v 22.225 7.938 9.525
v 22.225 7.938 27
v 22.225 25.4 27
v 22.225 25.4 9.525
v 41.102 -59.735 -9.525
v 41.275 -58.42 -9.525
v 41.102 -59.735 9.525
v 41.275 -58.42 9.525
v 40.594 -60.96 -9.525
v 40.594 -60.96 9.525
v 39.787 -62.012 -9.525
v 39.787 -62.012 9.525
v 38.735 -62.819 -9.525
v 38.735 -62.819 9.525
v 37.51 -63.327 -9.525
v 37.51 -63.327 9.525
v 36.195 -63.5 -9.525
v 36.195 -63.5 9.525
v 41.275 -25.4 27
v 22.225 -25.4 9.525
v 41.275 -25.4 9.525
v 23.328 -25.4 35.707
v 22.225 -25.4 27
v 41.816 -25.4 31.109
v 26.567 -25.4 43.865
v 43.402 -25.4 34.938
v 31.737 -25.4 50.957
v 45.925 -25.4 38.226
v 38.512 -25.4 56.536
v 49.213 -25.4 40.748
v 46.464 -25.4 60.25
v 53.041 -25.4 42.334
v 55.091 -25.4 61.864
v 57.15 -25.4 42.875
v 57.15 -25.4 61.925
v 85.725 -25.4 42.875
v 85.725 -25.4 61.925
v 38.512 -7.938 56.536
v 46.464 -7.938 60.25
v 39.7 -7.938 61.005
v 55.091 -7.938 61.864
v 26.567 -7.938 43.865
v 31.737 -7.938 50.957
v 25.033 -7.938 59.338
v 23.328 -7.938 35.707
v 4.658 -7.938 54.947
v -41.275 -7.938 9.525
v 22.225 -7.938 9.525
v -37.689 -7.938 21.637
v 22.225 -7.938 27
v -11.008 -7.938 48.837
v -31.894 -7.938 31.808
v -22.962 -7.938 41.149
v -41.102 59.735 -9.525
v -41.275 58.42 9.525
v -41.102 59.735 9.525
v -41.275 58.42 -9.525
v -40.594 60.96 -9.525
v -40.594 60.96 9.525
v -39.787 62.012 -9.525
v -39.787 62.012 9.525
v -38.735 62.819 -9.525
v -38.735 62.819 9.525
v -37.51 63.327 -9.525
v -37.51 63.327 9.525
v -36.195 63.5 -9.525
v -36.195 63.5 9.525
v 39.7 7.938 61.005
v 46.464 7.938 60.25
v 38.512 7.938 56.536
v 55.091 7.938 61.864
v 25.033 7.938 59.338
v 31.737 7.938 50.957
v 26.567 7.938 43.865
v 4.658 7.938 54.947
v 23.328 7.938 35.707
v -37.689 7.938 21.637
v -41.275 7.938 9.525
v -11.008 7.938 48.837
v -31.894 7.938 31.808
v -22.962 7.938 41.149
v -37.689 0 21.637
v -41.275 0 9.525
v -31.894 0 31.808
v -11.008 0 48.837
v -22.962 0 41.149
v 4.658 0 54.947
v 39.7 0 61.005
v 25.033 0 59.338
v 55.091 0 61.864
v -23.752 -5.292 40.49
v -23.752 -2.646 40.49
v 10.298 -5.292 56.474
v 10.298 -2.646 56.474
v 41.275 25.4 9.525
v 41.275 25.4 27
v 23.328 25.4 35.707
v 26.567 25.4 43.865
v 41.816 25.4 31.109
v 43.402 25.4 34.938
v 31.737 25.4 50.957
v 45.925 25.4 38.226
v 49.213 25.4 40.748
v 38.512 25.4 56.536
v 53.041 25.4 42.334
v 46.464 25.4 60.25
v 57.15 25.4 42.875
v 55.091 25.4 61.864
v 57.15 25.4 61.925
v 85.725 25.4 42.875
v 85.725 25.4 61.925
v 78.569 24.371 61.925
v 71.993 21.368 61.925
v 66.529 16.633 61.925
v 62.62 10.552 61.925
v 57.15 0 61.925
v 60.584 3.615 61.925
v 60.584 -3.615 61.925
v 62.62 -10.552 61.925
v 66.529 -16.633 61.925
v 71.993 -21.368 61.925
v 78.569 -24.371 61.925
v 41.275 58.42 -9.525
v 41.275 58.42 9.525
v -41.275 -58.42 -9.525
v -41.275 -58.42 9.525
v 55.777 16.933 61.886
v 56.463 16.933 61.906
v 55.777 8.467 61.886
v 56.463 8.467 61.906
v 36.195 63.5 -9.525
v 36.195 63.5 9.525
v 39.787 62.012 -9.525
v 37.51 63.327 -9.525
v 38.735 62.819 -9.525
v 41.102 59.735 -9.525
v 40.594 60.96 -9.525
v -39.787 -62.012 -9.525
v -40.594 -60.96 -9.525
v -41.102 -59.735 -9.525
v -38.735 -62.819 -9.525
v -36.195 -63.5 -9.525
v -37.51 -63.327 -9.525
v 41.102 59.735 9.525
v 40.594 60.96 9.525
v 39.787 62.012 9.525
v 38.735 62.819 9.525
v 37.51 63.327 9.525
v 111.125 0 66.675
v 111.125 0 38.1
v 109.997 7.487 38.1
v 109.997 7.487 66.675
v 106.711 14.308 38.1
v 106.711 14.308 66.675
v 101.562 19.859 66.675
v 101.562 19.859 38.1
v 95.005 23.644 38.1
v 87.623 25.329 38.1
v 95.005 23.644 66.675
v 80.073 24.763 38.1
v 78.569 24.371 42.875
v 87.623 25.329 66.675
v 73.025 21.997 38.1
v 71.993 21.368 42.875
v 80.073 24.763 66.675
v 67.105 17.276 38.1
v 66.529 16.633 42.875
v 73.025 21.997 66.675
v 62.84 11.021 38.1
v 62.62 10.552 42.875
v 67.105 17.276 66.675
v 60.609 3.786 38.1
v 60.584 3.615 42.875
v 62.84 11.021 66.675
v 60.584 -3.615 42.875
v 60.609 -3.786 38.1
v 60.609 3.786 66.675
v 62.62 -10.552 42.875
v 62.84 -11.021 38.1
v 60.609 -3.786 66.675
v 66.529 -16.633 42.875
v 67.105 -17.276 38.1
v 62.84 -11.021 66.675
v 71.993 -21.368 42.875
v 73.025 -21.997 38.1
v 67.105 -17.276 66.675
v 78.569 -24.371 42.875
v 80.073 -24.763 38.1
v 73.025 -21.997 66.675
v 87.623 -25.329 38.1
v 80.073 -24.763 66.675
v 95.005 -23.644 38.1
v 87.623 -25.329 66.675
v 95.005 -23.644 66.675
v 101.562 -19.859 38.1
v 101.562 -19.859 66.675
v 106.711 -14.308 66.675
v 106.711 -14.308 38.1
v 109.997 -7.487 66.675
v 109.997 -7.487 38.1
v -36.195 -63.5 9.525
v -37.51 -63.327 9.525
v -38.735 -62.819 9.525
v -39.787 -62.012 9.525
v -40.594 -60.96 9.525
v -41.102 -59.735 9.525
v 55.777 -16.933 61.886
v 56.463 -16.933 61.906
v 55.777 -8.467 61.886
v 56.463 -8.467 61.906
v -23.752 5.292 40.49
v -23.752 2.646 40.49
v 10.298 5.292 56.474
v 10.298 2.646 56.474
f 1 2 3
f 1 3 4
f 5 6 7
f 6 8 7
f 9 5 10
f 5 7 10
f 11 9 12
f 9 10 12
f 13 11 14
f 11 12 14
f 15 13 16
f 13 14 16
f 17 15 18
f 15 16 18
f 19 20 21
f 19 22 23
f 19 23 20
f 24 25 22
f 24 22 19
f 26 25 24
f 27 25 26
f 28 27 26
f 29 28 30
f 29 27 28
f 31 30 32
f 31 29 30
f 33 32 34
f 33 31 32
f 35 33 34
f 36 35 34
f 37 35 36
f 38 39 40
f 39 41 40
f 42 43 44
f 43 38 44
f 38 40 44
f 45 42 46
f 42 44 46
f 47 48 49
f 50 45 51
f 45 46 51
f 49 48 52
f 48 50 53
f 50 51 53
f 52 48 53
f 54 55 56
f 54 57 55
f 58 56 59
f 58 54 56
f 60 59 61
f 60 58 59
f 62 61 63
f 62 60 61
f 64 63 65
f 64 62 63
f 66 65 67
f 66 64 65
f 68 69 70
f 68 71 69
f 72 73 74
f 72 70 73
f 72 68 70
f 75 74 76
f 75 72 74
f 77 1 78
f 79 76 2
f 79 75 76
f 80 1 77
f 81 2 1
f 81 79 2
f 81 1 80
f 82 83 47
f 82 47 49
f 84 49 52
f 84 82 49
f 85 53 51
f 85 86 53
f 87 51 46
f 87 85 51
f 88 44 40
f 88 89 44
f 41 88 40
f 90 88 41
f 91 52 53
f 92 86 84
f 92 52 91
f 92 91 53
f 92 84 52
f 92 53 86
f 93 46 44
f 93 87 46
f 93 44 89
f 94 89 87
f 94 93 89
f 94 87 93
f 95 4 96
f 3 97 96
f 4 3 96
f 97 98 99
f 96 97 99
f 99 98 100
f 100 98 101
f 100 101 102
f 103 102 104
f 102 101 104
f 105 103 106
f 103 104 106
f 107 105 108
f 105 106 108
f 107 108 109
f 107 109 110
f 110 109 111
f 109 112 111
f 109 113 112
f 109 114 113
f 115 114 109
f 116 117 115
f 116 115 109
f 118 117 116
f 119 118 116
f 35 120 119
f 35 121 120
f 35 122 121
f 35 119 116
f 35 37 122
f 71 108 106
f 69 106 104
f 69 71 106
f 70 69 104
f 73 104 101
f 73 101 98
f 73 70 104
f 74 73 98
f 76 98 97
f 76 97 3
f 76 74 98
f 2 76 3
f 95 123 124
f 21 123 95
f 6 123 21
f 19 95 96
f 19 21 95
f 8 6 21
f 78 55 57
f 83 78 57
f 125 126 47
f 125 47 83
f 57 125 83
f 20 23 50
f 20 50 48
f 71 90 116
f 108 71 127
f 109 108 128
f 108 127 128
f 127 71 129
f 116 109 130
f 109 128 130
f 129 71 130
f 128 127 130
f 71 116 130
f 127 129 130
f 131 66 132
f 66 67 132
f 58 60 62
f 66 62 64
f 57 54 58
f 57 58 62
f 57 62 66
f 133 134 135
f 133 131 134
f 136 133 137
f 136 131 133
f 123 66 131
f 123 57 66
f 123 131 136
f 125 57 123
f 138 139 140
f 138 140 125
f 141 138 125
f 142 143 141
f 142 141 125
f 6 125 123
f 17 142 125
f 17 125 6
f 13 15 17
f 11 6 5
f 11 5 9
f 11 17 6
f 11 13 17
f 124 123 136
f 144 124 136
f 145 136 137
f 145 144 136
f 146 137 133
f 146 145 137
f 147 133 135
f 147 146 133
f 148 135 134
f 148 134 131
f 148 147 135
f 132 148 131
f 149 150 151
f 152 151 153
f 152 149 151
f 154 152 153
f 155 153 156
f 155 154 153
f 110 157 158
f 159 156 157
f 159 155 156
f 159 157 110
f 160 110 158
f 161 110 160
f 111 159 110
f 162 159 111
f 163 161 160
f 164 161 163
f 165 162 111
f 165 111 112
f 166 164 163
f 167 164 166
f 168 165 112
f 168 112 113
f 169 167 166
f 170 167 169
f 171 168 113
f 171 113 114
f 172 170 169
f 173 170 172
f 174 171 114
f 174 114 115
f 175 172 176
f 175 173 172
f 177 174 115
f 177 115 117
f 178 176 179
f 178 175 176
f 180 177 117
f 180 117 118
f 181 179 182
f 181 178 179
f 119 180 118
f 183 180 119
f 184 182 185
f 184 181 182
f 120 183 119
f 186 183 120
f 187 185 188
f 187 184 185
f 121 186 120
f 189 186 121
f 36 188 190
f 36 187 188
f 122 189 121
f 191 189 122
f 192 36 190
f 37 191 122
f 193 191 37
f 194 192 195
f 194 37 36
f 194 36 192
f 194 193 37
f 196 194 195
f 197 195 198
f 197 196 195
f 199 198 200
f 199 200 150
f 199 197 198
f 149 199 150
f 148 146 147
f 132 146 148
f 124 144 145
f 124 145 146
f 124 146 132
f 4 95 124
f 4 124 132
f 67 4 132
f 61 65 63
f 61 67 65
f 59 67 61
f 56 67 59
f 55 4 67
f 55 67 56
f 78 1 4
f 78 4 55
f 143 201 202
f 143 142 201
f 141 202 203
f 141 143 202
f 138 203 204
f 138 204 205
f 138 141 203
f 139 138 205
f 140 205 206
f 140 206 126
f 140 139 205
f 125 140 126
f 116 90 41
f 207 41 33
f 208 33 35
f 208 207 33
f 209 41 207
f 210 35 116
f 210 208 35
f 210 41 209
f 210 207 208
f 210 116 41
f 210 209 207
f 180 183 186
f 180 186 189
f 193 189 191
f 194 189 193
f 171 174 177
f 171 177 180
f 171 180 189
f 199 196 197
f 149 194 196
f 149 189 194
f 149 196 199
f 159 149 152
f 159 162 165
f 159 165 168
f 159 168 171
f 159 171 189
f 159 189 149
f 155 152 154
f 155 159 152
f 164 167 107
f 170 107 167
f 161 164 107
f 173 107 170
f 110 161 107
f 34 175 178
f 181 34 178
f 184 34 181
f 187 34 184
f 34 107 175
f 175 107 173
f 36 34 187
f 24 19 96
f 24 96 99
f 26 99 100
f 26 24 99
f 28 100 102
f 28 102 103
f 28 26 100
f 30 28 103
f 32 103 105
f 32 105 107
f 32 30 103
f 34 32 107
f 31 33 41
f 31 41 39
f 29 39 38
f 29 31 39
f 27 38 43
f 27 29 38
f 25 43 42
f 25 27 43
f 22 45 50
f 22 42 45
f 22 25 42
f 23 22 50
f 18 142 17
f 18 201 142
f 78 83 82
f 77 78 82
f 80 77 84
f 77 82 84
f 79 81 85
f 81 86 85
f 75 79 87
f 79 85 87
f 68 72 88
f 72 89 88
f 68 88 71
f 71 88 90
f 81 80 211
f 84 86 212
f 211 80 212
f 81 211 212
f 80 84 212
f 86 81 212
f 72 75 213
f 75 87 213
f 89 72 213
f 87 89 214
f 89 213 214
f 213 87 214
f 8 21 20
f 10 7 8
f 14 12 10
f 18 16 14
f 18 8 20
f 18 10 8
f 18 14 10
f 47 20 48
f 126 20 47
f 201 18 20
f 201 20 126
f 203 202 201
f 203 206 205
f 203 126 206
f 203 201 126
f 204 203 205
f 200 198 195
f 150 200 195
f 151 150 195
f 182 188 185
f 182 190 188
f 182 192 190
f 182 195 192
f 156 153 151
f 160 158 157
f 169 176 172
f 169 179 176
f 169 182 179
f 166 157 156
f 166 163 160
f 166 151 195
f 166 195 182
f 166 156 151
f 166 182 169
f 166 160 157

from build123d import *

# Parameters (mm, degrees)
F1_DEPTH = 63.5
F2_DEPTH = 7.9375
F0_W     = 25.4
F0_H     = 19.05
F3_DEPTH = 25.4
F5_R     = 5.08


with BuildPart() as f1:
    # F0 (on Front) → F1 (new body, symmetric)
    with BuildSketch(Plane.XZ):
        Polygon((-41.275, -9.525), (41.275, -9.525), (41.275, 9.525), (22.225, 9.525), (-41.275, 9.525), align=None)
    extrude(amount=F1_DEPTH, both=True)

    # F0 (on Front) → F2 (join, symmetric)
    with BuildSketch(Plane.XZ):
        with BuildLine():
            add(Edge.make_bspline(
                [(-41.275, 9.525), (-33.9425614897, 49.4436582621), (6.8530607315, 60.3077269566), (55.0914084511, 61.8644772166)],
                knots=[0, 0, 0, 0, 109.9439298496, 109.9439298496, 109.9439298496, 109.9439298496], degree=3))
            Line((-41.275, 9.525), (22.225, 9.525))
            Line((22.225, 9.525), (22.225, 27.0002))
            ThreePointArc((22.225, 27.0002), (31.7368937864, 50.9570290384), (55.0914084511, 61.8644772166))
        make_face()
    extrude(amount=F2_DEPTH, both=True)

    # F0 (on Front) → F3 (join, symmetric)
    with BuildSketch(Plane.XZ):
        with BuildLine():
            Line((22.225, 9.525), (41.275, 9.525))
            Line((41.275, 9.525), (41.275, 27.0002))
            ThreePointArc((41.275, 27.0002), (45.9246798487, 38.2255201513), (57.15, 42.8752))
            Line((57.15, 42.8752), (60.325, 42.8752))
            Line((60.325, 42.8752), (60.325, 61.9252))
            Line((60.325, 61.9252), (57.15, 61.9252))
            add(Edge.make_bspline(
                [(55.0914084511, 61.8644772166), (55.7761308376, 61.8865746101), (56.4623528267, 61.9067967122), (57.15, 61.9252)],
                knots=[109.9439298496, 109.9439298496, 109.9439298496, 109.9439298496, 111.5045361635, 111.5045361635, 111.5045361635, 111.5045361635], degree=3))
            ThreePointArc((55.0914084511, 61.8644772166), (31.7368937864, 50.9570290384), (22.225, 27.0002))
            Line((22.225, 27.0002), (22.225, 9.525))
        make_face()
        with Locations((73.025, 52.4002)):
            Rectangle(F0_W, F0_H)
    extrude(amount=F3_DEPTH, both=True)

    # F0 (on Front) → F4 (revolve)
    with BuildSketch(Plane.XZ):
        Polygon((85.725, 61.9252), (85.725, 42.8752), (85.725, 38.1), (111.125, 38.1), (111.125, 66.675), (85.725, 66.675), align=None)
    revolve(axis=Axis((85.725, 0, 52.3875), (0, 0, 1)))

    # F5
    f5_edges = [f1.edges().sort_by_distance(p)[0] for p in [
        (-41.275, -63.5, 0),
        (41.275, -63.5, 0),
        (-41.275, 63.5, 0),
        (41.275, 63.5, 0),
    ]]
    fillet(f5_edges, radius=F5_R)


solid = f1.part
